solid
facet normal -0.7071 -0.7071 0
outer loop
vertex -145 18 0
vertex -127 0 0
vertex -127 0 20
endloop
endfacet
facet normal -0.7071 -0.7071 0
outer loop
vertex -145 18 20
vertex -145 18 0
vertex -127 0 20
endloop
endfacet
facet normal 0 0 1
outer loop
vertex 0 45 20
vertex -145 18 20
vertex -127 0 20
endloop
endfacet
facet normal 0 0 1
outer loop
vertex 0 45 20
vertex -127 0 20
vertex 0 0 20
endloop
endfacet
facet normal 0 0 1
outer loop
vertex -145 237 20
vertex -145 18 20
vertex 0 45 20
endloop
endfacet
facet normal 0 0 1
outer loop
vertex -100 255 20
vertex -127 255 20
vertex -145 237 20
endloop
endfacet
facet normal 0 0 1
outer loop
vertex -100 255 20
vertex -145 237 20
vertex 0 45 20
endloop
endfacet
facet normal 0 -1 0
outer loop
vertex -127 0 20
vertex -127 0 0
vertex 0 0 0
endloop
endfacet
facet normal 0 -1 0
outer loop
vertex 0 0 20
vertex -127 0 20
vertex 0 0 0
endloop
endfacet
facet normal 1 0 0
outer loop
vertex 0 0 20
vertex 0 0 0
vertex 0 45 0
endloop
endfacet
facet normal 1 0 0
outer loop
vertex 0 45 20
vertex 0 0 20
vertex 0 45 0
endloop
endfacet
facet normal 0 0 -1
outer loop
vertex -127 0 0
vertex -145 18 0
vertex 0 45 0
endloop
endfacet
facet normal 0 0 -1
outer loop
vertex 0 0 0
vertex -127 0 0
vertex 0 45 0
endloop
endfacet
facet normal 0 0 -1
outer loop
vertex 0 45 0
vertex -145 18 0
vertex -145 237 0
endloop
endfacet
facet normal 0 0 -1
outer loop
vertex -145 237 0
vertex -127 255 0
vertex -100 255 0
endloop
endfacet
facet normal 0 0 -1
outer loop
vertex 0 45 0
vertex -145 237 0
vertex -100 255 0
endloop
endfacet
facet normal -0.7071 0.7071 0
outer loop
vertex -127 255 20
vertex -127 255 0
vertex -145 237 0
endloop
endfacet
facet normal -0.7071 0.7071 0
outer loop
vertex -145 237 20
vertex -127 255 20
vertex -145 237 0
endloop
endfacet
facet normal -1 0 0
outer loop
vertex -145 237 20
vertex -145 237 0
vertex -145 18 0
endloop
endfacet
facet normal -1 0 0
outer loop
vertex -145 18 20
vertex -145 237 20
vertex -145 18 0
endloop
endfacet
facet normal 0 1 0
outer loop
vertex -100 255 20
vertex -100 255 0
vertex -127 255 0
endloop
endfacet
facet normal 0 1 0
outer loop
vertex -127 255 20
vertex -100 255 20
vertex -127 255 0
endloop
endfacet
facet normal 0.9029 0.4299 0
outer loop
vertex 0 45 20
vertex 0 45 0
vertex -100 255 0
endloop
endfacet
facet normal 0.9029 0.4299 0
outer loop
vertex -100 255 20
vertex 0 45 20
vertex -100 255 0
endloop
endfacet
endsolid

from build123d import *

# Parameters (mm, degrees)
EXTRUDE_1_DEPTH = 20
CHAMFER_1_SIZE  = 18


with BuildPart() as part:
    # Эскиз1 → Бобышка-Вытянуть1 (new body)
    with BuildSketch(Plane.XY):
        Polygon((0, 0), (0, 45), (-100, 255), (-127, 255), (-145, 237), (-145, 0), align=None)
    extrude(amount=EXTRUDE_1_DEPTH)

    # Фаска1
    chamfer_1_edges = [part.edges().sort_by_distance(p)[0] for p in [
        (-145, 0, 10),
    ]]
    chamfer(chamfer_1_edges, length=CHAMFER_1_SIZE)


solid = part.part
